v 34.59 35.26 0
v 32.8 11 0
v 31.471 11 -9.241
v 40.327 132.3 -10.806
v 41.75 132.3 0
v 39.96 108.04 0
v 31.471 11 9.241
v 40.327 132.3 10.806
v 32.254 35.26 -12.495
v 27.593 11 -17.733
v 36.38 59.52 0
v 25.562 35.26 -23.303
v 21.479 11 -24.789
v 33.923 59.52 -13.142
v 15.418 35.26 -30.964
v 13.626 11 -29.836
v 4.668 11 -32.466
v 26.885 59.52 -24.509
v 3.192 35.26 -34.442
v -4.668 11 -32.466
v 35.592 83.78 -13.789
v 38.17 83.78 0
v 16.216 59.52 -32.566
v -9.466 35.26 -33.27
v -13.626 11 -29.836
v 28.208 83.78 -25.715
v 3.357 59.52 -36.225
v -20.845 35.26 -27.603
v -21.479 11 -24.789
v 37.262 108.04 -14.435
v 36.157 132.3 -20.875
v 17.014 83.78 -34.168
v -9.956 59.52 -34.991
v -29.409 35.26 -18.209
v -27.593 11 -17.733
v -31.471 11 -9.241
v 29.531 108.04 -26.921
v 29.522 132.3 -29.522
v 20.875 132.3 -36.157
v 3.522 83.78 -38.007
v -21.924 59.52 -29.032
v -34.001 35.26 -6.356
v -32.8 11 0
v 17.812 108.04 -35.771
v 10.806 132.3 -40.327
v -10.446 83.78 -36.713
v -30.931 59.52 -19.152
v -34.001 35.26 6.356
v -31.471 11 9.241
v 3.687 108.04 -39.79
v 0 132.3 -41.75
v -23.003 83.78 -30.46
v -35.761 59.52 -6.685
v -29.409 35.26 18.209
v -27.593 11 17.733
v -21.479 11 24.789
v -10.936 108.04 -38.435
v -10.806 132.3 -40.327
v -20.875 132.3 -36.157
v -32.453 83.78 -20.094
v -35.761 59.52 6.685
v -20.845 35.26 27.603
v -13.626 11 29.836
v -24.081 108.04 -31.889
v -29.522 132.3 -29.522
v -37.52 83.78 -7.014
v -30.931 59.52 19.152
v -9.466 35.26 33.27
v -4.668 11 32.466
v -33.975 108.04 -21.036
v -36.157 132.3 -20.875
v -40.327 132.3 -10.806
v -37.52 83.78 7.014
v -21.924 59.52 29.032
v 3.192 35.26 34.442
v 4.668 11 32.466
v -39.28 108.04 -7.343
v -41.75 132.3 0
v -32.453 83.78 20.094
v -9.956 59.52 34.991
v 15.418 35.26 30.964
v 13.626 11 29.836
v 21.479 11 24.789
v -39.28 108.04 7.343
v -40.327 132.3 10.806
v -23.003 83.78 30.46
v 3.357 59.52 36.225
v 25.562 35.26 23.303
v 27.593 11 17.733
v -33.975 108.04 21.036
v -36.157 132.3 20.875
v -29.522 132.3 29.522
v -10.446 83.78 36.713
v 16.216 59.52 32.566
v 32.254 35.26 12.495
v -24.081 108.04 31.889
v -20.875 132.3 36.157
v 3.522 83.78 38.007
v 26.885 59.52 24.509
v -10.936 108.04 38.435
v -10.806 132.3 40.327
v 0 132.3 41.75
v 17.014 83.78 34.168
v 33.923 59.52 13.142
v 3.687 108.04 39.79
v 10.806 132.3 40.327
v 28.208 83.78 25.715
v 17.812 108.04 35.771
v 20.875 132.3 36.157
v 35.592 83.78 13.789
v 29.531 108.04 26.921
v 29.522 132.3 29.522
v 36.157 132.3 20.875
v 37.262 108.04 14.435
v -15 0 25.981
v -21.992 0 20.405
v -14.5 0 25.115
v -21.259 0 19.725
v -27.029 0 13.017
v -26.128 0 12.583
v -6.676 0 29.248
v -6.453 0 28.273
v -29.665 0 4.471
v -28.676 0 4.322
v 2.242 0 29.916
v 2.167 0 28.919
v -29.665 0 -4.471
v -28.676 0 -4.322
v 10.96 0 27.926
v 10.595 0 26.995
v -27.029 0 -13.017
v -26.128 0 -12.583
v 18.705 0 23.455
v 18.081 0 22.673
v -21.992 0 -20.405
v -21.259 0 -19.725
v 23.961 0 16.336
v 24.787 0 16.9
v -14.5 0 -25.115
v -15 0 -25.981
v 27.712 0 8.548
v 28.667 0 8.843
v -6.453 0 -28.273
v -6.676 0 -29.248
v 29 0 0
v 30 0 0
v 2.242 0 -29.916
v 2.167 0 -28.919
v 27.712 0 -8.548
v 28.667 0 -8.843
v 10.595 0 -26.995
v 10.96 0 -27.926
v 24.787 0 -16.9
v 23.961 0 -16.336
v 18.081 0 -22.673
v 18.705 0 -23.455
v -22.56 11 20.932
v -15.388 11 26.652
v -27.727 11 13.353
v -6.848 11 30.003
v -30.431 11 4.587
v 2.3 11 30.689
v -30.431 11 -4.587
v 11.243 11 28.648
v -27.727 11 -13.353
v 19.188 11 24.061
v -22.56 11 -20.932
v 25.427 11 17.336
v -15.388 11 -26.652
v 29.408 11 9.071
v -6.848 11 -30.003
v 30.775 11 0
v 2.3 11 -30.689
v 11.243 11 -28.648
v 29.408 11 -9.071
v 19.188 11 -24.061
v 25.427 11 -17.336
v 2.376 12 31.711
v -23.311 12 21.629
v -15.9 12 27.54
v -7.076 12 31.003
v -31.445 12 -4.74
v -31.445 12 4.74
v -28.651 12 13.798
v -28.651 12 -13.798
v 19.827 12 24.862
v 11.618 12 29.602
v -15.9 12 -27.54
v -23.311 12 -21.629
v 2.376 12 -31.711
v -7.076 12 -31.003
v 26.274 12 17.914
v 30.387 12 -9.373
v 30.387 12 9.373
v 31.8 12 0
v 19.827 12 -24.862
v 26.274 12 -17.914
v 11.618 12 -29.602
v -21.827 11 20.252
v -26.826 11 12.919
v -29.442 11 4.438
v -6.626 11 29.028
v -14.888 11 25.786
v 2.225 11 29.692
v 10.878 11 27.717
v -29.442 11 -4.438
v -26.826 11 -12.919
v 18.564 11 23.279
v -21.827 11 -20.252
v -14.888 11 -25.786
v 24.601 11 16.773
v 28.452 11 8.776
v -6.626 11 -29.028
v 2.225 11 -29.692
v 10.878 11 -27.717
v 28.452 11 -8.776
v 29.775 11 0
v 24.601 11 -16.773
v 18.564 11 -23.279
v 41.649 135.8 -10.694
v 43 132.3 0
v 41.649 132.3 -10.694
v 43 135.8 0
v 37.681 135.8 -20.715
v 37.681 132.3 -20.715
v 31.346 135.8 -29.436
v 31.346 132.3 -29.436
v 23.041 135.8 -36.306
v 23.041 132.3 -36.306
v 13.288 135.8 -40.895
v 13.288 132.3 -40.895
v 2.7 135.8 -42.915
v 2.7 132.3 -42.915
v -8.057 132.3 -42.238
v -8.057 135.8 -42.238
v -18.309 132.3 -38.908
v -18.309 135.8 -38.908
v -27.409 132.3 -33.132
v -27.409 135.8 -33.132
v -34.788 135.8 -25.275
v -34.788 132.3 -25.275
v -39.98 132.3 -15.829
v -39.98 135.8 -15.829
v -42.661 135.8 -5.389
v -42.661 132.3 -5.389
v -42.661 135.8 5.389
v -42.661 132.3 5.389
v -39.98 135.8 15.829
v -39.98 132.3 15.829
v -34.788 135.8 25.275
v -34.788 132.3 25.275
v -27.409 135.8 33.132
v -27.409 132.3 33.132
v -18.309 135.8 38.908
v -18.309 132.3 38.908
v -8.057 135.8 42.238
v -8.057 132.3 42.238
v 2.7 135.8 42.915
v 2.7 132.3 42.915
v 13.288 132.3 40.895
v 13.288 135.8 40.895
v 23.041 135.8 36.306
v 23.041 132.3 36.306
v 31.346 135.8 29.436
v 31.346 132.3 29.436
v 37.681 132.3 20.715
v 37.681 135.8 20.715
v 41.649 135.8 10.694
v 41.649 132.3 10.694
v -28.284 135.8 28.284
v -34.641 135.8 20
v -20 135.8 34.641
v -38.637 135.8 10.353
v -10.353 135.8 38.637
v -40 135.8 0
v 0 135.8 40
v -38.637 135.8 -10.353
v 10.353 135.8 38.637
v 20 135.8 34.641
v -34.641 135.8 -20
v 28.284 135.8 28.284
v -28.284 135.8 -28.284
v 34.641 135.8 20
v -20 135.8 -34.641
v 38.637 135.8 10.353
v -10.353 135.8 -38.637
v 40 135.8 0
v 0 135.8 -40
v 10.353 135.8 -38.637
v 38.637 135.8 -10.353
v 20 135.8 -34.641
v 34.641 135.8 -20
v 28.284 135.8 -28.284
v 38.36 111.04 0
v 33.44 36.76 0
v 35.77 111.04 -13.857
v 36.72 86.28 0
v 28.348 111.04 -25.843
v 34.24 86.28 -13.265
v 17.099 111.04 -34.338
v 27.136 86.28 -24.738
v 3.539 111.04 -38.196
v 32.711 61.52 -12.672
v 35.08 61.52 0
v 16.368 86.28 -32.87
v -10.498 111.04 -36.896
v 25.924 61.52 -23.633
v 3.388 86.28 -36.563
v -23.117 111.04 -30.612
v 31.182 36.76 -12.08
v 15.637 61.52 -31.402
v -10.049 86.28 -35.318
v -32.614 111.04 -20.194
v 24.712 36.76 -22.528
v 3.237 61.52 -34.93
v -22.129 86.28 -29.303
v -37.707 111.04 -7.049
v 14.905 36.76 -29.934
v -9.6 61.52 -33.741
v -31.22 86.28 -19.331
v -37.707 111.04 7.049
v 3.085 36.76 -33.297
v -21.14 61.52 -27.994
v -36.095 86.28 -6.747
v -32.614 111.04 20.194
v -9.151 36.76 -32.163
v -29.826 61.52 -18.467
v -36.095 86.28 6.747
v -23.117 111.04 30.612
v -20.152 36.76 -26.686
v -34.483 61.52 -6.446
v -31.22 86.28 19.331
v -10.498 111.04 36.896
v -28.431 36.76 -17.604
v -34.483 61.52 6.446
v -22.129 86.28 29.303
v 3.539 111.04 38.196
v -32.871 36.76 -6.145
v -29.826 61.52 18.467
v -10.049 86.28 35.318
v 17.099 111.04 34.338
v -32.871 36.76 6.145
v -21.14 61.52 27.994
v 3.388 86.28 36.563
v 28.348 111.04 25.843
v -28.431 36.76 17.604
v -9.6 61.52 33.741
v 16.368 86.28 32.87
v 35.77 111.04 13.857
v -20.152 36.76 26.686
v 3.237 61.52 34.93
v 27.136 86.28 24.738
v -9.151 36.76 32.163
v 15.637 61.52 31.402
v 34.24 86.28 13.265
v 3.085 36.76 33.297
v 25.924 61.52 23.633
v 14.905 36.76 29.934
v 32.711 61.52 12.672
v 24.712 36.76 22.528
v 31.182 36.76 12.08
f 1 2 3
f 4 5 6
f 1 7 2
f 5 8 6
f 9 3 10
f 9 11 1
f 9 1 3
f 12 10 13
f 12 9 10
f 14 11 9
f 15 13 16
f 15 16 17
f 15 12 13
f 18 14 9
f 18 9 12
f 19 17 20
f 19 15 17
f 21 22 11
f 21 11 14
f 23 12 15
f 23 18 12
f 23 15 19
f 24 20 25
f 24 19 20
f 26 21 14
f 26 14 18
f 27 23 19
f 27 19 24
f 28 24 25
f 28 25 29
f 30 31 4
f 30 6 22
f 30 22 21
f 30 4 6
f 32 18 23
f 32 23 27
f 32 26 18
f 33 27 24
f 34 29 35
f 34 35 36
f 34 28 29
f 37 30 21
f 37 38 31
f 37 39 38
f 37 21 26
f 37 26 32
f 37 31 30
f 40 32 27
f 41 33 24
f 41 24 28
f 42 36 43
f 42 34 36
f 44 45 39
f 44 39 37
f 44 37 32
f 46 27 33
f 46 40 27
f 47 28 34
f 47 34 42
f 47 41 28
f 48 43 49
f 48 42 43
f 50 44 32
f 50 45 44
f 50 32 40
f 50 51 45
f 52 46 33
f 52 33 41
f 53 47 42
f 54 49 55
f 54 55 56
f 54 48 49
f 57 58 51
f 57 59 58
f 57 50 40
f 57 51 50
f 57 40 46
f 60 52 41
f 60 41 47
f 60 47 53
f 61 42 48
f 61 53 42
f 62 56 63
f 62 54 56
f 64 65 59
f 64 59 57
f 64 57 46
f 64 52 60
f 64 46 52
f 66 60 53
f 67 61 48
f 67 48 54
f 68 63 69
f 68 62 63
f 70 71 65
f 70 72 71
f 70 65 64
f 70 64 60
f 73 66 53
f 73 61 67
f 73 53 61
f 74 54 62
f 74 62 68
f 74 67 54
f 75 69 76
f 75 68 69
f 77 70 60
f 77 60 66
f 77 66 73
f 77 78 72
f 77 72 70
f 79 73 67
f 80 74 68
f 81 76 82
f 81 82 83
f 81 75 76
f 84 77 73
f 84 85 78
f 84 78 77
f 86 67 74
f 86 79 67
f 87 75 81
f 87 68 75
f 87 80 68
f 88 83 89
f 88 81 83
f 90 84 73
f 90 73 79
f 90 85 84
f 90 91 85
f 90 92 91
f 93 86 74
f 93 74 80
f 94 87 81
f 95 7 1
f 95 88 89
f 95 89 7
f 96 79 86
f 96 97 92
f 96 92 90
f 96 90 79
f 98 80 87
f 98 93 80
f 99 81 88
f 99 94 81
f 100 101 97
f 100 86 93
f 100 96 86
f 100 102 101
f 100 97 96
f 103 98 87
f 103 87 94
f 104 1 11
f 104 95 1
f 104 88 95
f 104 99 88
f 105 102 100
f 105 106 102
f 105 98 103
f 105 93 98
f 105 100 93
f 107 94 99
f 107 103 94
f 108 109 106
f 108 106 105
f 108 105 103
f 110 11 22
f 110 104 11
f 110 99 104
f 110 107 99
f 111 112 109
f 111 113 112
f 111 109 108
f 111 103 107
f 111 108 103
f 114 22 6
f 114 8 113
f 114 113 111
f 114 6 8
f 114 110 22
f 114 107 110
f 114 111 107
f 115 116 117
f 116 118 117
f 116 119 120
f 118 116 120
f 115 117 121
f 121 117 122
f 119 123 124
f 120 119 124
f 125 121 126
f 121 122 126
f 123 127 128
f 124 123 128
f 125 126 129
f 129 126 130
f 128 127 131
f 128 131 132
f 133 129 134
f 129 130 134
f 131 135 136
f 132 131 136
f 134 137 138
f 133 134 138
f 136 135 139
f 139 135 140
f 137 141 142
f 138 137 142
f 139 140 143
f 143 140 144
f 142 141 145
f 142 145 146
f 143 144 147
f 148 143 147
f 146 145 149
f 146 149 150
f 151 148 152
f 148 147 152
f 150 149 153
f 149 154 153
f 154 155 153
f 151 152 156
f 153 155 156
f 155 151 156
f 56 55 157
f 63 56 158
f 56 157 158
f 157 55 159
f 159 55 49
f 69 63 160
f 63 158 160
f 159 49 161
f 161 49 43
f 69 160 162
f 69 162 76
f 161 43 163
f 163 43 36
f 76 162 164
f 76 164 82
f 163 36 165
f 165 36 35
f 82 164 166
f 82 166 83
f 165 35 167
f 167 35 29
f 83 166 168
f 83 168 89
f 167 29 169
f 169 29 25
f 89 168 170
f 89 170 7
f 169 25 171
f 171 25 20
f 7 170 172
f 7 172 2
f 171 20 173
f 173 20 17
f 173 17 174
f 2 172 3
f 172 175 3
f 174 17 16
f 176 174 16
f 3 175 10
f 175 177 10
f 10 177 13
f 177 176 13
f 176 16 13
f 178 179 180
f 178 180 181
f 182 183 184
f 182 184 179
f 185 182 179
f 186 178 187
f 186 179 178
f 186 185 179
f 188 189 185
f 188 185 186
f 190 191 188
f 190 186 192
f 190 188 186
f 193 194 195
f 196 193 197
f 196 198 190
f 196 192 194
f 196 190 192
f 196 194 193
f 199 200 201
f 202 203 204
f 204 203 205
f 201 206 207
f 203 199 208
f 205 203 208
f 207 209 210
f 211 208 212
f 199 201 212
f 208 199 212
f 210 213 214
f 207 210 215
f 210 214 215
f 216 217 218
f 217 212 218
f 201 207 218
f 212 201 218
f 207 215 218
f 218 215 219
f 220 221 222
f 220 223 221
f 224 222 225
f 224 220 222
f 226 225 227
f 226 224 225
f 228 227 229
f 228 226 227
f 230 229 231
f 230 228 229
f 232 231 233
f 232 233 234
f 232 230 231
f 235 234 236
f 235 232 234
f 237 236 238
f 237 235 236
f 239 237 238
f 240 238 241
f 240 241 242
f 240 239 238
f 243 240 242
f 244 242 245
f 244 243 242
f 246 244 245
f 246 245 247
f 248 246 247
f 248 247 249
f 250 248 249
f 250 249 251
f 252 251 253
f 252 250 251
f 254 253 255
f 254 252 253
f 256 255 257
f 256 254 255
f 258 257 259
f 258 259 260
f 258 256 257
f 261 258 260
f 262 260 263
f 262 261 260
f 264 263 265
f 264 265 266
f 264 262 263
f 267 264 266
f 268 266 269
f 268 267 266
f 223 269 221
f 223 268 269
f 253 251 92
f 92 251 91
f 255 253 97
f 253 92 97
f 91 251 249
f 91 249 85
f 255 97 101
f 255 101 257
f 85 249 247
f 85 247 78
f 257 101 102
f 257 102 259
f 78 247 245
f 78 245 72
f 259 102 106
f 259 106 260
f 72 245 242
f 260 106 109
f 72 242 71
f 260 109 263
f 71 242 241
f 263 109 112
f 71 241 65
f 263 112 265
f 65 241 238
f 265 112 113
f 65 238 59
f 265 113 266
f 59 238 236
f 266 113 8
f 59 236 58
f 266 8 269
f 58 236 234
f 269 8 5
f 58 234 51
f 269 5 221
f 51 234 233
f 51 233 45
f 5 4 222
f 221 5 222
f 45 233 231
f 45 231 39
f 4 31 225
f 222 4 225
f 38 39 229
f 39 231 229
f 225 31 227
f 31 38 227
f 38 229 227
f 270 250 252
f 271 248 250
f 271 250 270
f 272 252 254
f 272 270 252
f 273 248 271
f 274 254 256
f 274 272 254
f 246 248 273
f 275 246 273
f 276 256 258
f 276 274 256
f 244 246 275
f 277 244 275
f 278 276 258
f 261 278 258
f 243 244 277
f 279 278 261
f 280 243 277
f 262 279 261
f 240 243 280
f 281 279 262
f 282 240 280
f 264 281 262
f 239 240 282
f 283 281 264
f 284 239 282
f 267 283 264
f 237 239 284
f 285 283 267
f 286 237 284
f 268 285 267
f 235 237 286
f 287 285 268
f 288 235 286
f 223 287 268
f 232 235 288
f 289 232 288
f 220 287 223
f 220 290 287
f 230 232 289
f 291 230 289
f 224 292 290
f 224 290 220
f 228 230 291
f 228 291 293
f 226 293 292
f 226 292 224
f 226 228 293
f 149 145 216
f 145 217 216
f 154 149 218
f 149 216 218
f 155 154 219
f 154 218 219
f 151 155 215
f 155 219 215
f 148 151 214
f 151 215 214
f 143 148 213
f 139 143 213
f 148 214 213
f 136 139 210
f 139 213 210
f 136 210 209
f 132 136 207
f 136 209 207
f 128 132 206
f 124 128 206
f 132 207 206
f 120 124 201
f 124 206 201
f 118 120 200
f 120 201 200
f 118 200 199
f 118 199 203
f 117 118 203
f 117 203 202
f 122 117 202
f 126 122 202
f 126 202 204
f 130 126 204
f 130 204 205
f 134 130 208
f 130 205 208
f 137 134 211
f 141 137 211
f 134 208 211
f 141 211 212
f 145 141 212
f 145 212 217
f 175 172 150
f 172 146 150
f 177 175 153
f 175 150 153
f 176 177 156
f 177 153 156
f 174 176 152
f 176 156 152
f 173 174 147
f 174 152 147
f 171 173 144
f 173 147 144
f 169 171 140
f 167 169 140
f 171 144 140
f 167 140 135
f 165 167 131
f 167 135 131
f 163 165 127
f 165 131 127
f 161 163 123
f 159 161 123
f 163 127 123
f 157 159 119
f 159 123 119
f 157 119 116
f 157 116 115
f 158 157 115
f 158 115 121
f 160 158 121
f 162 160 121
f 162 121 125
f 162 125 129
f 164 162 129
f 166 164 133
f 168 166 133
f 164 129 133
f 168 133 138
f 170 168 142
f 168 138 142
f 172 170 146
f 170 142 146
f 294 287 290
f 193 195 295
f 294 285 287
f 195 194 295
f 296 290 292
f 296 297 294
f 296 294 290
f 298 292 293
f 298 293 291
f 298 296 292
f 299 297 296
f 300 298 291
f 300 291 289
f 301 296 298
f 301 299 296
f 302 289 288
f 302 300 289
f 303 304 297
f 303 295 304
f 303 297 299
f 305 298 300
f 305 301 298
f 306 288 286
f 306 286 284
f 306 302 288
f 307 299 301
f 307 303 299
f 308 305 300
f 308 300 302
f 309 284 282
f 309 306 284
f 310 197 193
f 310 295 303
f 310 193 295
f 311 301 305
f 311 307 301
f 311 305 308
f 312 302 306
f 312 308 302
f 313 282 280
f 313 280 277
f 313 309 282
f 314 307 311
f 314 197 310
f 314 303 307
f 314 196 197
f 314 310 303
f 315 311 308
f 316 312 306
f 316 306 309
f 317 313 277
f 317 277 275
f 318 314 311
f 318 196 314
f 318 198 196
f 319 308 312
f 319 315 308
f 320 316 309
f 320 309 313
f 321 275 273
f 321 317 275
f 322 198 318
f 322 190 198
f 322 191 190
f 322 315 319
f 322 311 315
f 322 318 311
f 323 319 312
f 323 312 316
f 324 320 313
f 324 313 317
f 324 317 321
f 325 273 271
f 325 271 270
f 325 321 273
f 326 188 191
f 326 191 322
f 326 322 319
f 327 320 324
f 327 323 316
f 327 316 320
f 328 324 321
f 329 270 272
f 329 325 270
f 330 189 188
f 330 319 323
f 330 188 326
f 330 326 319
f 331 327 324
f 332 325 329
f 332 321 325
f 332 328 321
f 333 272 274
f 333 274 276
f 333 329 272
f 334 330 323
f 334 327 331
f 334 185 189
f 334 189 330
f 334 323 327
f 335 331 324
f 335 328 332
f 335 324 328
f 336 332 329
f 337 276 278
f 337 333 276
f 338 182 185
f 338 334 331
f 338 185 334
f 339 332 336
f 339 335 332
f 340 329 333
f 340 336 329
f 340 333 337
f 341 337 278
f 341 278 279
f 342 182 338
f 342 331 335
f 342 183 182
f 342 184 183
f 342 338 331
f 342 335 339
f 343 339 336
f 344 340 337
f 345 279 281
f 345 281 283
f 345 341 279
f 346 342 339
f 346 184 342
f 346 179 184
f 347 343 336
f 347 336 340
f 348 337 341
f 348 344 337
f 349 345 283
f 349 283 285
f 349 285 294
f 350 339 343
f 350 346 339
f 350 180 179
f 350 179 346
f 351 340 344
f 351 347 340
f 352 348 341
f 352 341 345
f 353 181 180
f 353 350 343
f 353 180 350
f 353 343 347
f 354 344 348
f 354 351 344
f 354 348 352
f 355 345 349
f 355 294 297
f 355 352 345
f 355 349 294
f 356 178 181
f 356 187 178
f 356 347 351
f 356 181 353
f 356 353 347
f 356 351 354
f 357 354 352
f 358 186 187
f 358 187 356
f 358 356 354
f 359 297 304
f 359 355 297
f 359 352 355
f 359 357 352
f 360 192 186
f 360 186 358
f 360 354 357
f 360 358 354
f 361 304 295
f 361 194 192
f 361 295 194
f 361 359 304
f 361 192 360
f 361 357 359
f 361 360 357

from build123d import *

# Parameters (mm, degrees)
SKETCH_5_R  = 43
SKETCH_6_R  = 43
SKETCH_3_R  = 32.8
SKETCH_4_R  = 41.75
SKETCH_2_R  = 30.775
SKETCH_1_R  = 30
SKETCH_11_R = 29
SKETCH_12_R = 29.775
SKETCH_13_R = 40
SKETCH_14_R = 31.8


with BuildPart() as part:
    # 草图5 → Loft 2 section 0
    with BuildSketch(Plane(origin=(0, 132.3, 0), x_dir=(1, 0, 0), z_dir=(0, 1, 0))):
        Circle(SKETCH_5_R)
    # 草图6 → Loft 2 section 1
    with BuildSketch(Plane(origin=(0, 135.8, 0), x_dir=(1, 0, 0), z_dir=(0, 1, 0))):
        Circle(SKETCH_6_R)
    loft()

    # 草图3 → 放样3 section 0
    with BuildSketch(Plane(origin=(0, 11, 0), x_dir=(1, 0, 0), z_dir=(0, 1, 0))):
        Circle(SKETCH_3_R)
    # 草图4 → 放样3 section 1
    with BuildSketch(Plane(origin=(0, 132.3, 0), x_dir=(1, 0, 0), z_dir=(0, 1, 0))):
        Circle(SKETCH_4_R)
    loft()

    # 草图2 → 放样4 section 0
    with BuildSketch(Plane(origin=(0, 11, 0), x_dir=(1, 0, 0), z_dir=(0, 1, 0))):
        Circle(SKETCH_2_R)
    # 草图1 → 放样4 section 1
    with BuildSketch(Plane(origin=(0, 0, 0), x_dir=(1, 0, 0), z_dir=(0, 1, 0))):
        Circle(SKETCH_1_R)
    loft()

    # 草图11 → 切除-放样1 section 0
    with BuildSketch(Plane(origin=(0, 0, 0), x_dir=(1, 0, 0), z_dir=(0, 1, 0))):
        Circle(SKETCH_11_R)
    # 草图12 → 切除-放样1 section 1
    with BuildSketch(Plane(origin=(0, 11, 0), x_dir=(1, 0, 0), z_dir=(0, 1, 0))):
        Circle(SKETCH_12_R)
    loft(mode=Mode.SUBTRACT)

    # 草图13 → Loft 2 2 section 0
    with BuildSketch(Plane(origin=(0, 135.8, 0), x_dir=(1, 0, 0), z_dir=(0, 1, 0))):
        Circle(SKETCH_13_R)
    # 草图14 → Loft 2 2 section 1
    with BuildSketch(Plane(origin=(0, 12, 0), x_dir=(1, 0, 0), z_dir=(0, 1, 0))):
        Circle(SKETCH_14_R)
    loft(mode=Mode.SUBTRACT)


solid = part.part
